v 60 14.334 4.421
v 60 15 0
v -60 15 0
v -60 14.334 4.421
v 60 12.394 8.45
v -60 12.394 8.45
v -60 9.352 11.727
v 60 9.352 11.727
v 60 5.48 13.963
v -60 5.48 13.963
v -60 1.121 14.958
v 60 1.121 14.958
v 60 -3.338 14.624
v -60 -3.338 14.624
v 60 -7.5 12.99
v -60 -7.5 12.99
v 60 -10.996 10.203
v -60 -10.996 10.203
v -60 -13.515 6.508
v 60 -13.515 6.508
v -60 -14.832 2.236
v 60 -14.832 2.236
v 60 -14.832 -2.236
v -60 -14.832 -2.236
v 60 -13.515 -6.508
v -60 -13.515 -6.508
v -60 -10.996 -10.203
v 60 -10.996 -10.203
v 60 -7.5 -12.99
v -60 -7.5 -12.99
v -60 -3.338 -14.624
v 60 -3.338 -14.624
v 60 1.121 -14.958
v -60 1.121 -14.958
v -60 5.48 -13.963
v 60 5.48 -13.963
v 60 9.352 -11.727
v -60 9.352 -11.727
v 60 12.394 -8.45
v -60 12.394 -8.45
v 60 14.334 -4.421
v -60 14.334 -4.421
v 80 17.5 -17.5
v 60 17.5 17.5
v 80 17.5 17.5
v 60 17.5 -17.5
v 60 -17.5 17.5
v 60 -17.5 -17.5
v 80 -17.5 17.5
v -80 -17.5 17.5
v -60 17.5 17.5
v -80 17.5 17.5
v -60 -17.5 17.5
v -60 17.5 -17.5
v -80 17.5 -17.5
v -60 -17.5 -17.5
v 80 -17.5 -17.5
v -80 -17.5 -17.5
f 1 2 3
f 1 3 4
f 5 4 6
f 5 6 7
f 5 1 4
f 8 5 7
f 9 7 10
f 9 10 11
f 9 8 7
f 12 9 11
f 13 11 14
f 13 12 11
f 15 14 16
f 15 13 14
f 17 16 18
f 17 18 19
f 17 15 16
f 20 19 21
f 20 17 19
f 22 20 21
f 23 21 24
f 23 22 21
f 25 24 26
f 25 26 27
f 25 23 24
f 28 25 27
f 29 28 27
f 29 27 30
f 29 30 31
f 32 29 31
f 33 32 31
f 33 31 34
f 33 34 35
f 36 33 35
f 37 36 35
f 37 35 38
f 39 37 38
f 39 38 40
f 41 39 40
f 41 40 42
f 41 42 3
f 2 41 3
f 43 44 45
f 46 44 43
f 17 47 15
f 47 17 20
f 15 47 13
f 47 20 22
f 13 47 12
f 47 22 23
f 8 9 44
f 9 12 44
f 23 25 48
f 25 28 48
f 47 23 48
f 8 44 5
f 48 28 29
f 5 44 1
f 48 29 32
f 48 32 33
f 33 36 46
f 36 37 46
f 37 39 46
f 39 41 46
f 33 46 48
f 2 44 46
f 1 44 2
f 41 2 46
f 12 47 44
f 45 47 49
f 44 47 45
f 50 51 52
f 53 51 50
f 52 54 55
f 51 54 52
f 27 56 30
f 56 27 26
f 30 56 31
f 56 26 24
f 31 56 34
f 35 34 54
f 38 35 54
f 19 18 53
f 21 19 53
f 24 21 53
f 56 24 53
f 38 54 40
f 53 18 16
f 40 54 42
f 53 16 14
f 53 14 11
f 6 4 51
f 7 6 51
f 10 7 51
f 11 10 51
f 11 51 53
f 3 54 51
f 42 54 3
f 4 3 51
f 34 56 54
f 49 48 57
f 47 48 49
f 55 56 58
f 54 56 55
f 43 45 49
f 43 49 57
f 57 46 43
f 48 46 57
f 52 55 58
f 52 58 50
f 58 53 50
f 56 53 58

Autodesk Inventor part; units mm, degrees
ref_plane "YZ Plane" through (0, 0, 0) normal (1, 0, 0) x (0, 1, 0)
ref_plane "XZ Plane" through (0, 0, 0) normal (0, 1, 0) x (-1, 0, 0)
ref_plane "XY Plane" through (0, 0, 0) normal (0, 0, 1) x (1, 0, 0)
sketch "Sketch1" plane through (0, 0, 0) normal (1, 0, 0) x (0, 1, 0)
  circle A0 centre (0, 0) radius 15
  dimension "d0" = 30
extrude "Extrusion1" add sketch "Sketch1" along normal mid plane 120
sketch "Sketch2" plane through (60, 0, 0) normal (1, 0, 0) x (0, 0, -1)
  line L0 (-17.5, 17.5) -> (17.5, 17.5)
  line L1 (17.5, 17.5) -> (17.5, -17.5)
  line L2 (17.5, -17.5) -> (-17.5, -17.5)
  line L3 (-17.5, -17.5) -> (-17.5, 17.5)
  line L4 (-17.5, 17.5) -> (17.5, -17.5) construction
  line L5 (17.5, 17.5) -> (-17.5, -17.5) construction
  point P0 (0, 0)
  dimension "d3" = 35
  dimension "d4" = 35
extrude "Extrusion2" add sketch "Sketch2" along normal blind 20
mirror "Mirror1" about plane through (0, 0, 0) normal (1, 0, 0) of "Extrusion2"
properties part number "ROLLER SHAFT"
